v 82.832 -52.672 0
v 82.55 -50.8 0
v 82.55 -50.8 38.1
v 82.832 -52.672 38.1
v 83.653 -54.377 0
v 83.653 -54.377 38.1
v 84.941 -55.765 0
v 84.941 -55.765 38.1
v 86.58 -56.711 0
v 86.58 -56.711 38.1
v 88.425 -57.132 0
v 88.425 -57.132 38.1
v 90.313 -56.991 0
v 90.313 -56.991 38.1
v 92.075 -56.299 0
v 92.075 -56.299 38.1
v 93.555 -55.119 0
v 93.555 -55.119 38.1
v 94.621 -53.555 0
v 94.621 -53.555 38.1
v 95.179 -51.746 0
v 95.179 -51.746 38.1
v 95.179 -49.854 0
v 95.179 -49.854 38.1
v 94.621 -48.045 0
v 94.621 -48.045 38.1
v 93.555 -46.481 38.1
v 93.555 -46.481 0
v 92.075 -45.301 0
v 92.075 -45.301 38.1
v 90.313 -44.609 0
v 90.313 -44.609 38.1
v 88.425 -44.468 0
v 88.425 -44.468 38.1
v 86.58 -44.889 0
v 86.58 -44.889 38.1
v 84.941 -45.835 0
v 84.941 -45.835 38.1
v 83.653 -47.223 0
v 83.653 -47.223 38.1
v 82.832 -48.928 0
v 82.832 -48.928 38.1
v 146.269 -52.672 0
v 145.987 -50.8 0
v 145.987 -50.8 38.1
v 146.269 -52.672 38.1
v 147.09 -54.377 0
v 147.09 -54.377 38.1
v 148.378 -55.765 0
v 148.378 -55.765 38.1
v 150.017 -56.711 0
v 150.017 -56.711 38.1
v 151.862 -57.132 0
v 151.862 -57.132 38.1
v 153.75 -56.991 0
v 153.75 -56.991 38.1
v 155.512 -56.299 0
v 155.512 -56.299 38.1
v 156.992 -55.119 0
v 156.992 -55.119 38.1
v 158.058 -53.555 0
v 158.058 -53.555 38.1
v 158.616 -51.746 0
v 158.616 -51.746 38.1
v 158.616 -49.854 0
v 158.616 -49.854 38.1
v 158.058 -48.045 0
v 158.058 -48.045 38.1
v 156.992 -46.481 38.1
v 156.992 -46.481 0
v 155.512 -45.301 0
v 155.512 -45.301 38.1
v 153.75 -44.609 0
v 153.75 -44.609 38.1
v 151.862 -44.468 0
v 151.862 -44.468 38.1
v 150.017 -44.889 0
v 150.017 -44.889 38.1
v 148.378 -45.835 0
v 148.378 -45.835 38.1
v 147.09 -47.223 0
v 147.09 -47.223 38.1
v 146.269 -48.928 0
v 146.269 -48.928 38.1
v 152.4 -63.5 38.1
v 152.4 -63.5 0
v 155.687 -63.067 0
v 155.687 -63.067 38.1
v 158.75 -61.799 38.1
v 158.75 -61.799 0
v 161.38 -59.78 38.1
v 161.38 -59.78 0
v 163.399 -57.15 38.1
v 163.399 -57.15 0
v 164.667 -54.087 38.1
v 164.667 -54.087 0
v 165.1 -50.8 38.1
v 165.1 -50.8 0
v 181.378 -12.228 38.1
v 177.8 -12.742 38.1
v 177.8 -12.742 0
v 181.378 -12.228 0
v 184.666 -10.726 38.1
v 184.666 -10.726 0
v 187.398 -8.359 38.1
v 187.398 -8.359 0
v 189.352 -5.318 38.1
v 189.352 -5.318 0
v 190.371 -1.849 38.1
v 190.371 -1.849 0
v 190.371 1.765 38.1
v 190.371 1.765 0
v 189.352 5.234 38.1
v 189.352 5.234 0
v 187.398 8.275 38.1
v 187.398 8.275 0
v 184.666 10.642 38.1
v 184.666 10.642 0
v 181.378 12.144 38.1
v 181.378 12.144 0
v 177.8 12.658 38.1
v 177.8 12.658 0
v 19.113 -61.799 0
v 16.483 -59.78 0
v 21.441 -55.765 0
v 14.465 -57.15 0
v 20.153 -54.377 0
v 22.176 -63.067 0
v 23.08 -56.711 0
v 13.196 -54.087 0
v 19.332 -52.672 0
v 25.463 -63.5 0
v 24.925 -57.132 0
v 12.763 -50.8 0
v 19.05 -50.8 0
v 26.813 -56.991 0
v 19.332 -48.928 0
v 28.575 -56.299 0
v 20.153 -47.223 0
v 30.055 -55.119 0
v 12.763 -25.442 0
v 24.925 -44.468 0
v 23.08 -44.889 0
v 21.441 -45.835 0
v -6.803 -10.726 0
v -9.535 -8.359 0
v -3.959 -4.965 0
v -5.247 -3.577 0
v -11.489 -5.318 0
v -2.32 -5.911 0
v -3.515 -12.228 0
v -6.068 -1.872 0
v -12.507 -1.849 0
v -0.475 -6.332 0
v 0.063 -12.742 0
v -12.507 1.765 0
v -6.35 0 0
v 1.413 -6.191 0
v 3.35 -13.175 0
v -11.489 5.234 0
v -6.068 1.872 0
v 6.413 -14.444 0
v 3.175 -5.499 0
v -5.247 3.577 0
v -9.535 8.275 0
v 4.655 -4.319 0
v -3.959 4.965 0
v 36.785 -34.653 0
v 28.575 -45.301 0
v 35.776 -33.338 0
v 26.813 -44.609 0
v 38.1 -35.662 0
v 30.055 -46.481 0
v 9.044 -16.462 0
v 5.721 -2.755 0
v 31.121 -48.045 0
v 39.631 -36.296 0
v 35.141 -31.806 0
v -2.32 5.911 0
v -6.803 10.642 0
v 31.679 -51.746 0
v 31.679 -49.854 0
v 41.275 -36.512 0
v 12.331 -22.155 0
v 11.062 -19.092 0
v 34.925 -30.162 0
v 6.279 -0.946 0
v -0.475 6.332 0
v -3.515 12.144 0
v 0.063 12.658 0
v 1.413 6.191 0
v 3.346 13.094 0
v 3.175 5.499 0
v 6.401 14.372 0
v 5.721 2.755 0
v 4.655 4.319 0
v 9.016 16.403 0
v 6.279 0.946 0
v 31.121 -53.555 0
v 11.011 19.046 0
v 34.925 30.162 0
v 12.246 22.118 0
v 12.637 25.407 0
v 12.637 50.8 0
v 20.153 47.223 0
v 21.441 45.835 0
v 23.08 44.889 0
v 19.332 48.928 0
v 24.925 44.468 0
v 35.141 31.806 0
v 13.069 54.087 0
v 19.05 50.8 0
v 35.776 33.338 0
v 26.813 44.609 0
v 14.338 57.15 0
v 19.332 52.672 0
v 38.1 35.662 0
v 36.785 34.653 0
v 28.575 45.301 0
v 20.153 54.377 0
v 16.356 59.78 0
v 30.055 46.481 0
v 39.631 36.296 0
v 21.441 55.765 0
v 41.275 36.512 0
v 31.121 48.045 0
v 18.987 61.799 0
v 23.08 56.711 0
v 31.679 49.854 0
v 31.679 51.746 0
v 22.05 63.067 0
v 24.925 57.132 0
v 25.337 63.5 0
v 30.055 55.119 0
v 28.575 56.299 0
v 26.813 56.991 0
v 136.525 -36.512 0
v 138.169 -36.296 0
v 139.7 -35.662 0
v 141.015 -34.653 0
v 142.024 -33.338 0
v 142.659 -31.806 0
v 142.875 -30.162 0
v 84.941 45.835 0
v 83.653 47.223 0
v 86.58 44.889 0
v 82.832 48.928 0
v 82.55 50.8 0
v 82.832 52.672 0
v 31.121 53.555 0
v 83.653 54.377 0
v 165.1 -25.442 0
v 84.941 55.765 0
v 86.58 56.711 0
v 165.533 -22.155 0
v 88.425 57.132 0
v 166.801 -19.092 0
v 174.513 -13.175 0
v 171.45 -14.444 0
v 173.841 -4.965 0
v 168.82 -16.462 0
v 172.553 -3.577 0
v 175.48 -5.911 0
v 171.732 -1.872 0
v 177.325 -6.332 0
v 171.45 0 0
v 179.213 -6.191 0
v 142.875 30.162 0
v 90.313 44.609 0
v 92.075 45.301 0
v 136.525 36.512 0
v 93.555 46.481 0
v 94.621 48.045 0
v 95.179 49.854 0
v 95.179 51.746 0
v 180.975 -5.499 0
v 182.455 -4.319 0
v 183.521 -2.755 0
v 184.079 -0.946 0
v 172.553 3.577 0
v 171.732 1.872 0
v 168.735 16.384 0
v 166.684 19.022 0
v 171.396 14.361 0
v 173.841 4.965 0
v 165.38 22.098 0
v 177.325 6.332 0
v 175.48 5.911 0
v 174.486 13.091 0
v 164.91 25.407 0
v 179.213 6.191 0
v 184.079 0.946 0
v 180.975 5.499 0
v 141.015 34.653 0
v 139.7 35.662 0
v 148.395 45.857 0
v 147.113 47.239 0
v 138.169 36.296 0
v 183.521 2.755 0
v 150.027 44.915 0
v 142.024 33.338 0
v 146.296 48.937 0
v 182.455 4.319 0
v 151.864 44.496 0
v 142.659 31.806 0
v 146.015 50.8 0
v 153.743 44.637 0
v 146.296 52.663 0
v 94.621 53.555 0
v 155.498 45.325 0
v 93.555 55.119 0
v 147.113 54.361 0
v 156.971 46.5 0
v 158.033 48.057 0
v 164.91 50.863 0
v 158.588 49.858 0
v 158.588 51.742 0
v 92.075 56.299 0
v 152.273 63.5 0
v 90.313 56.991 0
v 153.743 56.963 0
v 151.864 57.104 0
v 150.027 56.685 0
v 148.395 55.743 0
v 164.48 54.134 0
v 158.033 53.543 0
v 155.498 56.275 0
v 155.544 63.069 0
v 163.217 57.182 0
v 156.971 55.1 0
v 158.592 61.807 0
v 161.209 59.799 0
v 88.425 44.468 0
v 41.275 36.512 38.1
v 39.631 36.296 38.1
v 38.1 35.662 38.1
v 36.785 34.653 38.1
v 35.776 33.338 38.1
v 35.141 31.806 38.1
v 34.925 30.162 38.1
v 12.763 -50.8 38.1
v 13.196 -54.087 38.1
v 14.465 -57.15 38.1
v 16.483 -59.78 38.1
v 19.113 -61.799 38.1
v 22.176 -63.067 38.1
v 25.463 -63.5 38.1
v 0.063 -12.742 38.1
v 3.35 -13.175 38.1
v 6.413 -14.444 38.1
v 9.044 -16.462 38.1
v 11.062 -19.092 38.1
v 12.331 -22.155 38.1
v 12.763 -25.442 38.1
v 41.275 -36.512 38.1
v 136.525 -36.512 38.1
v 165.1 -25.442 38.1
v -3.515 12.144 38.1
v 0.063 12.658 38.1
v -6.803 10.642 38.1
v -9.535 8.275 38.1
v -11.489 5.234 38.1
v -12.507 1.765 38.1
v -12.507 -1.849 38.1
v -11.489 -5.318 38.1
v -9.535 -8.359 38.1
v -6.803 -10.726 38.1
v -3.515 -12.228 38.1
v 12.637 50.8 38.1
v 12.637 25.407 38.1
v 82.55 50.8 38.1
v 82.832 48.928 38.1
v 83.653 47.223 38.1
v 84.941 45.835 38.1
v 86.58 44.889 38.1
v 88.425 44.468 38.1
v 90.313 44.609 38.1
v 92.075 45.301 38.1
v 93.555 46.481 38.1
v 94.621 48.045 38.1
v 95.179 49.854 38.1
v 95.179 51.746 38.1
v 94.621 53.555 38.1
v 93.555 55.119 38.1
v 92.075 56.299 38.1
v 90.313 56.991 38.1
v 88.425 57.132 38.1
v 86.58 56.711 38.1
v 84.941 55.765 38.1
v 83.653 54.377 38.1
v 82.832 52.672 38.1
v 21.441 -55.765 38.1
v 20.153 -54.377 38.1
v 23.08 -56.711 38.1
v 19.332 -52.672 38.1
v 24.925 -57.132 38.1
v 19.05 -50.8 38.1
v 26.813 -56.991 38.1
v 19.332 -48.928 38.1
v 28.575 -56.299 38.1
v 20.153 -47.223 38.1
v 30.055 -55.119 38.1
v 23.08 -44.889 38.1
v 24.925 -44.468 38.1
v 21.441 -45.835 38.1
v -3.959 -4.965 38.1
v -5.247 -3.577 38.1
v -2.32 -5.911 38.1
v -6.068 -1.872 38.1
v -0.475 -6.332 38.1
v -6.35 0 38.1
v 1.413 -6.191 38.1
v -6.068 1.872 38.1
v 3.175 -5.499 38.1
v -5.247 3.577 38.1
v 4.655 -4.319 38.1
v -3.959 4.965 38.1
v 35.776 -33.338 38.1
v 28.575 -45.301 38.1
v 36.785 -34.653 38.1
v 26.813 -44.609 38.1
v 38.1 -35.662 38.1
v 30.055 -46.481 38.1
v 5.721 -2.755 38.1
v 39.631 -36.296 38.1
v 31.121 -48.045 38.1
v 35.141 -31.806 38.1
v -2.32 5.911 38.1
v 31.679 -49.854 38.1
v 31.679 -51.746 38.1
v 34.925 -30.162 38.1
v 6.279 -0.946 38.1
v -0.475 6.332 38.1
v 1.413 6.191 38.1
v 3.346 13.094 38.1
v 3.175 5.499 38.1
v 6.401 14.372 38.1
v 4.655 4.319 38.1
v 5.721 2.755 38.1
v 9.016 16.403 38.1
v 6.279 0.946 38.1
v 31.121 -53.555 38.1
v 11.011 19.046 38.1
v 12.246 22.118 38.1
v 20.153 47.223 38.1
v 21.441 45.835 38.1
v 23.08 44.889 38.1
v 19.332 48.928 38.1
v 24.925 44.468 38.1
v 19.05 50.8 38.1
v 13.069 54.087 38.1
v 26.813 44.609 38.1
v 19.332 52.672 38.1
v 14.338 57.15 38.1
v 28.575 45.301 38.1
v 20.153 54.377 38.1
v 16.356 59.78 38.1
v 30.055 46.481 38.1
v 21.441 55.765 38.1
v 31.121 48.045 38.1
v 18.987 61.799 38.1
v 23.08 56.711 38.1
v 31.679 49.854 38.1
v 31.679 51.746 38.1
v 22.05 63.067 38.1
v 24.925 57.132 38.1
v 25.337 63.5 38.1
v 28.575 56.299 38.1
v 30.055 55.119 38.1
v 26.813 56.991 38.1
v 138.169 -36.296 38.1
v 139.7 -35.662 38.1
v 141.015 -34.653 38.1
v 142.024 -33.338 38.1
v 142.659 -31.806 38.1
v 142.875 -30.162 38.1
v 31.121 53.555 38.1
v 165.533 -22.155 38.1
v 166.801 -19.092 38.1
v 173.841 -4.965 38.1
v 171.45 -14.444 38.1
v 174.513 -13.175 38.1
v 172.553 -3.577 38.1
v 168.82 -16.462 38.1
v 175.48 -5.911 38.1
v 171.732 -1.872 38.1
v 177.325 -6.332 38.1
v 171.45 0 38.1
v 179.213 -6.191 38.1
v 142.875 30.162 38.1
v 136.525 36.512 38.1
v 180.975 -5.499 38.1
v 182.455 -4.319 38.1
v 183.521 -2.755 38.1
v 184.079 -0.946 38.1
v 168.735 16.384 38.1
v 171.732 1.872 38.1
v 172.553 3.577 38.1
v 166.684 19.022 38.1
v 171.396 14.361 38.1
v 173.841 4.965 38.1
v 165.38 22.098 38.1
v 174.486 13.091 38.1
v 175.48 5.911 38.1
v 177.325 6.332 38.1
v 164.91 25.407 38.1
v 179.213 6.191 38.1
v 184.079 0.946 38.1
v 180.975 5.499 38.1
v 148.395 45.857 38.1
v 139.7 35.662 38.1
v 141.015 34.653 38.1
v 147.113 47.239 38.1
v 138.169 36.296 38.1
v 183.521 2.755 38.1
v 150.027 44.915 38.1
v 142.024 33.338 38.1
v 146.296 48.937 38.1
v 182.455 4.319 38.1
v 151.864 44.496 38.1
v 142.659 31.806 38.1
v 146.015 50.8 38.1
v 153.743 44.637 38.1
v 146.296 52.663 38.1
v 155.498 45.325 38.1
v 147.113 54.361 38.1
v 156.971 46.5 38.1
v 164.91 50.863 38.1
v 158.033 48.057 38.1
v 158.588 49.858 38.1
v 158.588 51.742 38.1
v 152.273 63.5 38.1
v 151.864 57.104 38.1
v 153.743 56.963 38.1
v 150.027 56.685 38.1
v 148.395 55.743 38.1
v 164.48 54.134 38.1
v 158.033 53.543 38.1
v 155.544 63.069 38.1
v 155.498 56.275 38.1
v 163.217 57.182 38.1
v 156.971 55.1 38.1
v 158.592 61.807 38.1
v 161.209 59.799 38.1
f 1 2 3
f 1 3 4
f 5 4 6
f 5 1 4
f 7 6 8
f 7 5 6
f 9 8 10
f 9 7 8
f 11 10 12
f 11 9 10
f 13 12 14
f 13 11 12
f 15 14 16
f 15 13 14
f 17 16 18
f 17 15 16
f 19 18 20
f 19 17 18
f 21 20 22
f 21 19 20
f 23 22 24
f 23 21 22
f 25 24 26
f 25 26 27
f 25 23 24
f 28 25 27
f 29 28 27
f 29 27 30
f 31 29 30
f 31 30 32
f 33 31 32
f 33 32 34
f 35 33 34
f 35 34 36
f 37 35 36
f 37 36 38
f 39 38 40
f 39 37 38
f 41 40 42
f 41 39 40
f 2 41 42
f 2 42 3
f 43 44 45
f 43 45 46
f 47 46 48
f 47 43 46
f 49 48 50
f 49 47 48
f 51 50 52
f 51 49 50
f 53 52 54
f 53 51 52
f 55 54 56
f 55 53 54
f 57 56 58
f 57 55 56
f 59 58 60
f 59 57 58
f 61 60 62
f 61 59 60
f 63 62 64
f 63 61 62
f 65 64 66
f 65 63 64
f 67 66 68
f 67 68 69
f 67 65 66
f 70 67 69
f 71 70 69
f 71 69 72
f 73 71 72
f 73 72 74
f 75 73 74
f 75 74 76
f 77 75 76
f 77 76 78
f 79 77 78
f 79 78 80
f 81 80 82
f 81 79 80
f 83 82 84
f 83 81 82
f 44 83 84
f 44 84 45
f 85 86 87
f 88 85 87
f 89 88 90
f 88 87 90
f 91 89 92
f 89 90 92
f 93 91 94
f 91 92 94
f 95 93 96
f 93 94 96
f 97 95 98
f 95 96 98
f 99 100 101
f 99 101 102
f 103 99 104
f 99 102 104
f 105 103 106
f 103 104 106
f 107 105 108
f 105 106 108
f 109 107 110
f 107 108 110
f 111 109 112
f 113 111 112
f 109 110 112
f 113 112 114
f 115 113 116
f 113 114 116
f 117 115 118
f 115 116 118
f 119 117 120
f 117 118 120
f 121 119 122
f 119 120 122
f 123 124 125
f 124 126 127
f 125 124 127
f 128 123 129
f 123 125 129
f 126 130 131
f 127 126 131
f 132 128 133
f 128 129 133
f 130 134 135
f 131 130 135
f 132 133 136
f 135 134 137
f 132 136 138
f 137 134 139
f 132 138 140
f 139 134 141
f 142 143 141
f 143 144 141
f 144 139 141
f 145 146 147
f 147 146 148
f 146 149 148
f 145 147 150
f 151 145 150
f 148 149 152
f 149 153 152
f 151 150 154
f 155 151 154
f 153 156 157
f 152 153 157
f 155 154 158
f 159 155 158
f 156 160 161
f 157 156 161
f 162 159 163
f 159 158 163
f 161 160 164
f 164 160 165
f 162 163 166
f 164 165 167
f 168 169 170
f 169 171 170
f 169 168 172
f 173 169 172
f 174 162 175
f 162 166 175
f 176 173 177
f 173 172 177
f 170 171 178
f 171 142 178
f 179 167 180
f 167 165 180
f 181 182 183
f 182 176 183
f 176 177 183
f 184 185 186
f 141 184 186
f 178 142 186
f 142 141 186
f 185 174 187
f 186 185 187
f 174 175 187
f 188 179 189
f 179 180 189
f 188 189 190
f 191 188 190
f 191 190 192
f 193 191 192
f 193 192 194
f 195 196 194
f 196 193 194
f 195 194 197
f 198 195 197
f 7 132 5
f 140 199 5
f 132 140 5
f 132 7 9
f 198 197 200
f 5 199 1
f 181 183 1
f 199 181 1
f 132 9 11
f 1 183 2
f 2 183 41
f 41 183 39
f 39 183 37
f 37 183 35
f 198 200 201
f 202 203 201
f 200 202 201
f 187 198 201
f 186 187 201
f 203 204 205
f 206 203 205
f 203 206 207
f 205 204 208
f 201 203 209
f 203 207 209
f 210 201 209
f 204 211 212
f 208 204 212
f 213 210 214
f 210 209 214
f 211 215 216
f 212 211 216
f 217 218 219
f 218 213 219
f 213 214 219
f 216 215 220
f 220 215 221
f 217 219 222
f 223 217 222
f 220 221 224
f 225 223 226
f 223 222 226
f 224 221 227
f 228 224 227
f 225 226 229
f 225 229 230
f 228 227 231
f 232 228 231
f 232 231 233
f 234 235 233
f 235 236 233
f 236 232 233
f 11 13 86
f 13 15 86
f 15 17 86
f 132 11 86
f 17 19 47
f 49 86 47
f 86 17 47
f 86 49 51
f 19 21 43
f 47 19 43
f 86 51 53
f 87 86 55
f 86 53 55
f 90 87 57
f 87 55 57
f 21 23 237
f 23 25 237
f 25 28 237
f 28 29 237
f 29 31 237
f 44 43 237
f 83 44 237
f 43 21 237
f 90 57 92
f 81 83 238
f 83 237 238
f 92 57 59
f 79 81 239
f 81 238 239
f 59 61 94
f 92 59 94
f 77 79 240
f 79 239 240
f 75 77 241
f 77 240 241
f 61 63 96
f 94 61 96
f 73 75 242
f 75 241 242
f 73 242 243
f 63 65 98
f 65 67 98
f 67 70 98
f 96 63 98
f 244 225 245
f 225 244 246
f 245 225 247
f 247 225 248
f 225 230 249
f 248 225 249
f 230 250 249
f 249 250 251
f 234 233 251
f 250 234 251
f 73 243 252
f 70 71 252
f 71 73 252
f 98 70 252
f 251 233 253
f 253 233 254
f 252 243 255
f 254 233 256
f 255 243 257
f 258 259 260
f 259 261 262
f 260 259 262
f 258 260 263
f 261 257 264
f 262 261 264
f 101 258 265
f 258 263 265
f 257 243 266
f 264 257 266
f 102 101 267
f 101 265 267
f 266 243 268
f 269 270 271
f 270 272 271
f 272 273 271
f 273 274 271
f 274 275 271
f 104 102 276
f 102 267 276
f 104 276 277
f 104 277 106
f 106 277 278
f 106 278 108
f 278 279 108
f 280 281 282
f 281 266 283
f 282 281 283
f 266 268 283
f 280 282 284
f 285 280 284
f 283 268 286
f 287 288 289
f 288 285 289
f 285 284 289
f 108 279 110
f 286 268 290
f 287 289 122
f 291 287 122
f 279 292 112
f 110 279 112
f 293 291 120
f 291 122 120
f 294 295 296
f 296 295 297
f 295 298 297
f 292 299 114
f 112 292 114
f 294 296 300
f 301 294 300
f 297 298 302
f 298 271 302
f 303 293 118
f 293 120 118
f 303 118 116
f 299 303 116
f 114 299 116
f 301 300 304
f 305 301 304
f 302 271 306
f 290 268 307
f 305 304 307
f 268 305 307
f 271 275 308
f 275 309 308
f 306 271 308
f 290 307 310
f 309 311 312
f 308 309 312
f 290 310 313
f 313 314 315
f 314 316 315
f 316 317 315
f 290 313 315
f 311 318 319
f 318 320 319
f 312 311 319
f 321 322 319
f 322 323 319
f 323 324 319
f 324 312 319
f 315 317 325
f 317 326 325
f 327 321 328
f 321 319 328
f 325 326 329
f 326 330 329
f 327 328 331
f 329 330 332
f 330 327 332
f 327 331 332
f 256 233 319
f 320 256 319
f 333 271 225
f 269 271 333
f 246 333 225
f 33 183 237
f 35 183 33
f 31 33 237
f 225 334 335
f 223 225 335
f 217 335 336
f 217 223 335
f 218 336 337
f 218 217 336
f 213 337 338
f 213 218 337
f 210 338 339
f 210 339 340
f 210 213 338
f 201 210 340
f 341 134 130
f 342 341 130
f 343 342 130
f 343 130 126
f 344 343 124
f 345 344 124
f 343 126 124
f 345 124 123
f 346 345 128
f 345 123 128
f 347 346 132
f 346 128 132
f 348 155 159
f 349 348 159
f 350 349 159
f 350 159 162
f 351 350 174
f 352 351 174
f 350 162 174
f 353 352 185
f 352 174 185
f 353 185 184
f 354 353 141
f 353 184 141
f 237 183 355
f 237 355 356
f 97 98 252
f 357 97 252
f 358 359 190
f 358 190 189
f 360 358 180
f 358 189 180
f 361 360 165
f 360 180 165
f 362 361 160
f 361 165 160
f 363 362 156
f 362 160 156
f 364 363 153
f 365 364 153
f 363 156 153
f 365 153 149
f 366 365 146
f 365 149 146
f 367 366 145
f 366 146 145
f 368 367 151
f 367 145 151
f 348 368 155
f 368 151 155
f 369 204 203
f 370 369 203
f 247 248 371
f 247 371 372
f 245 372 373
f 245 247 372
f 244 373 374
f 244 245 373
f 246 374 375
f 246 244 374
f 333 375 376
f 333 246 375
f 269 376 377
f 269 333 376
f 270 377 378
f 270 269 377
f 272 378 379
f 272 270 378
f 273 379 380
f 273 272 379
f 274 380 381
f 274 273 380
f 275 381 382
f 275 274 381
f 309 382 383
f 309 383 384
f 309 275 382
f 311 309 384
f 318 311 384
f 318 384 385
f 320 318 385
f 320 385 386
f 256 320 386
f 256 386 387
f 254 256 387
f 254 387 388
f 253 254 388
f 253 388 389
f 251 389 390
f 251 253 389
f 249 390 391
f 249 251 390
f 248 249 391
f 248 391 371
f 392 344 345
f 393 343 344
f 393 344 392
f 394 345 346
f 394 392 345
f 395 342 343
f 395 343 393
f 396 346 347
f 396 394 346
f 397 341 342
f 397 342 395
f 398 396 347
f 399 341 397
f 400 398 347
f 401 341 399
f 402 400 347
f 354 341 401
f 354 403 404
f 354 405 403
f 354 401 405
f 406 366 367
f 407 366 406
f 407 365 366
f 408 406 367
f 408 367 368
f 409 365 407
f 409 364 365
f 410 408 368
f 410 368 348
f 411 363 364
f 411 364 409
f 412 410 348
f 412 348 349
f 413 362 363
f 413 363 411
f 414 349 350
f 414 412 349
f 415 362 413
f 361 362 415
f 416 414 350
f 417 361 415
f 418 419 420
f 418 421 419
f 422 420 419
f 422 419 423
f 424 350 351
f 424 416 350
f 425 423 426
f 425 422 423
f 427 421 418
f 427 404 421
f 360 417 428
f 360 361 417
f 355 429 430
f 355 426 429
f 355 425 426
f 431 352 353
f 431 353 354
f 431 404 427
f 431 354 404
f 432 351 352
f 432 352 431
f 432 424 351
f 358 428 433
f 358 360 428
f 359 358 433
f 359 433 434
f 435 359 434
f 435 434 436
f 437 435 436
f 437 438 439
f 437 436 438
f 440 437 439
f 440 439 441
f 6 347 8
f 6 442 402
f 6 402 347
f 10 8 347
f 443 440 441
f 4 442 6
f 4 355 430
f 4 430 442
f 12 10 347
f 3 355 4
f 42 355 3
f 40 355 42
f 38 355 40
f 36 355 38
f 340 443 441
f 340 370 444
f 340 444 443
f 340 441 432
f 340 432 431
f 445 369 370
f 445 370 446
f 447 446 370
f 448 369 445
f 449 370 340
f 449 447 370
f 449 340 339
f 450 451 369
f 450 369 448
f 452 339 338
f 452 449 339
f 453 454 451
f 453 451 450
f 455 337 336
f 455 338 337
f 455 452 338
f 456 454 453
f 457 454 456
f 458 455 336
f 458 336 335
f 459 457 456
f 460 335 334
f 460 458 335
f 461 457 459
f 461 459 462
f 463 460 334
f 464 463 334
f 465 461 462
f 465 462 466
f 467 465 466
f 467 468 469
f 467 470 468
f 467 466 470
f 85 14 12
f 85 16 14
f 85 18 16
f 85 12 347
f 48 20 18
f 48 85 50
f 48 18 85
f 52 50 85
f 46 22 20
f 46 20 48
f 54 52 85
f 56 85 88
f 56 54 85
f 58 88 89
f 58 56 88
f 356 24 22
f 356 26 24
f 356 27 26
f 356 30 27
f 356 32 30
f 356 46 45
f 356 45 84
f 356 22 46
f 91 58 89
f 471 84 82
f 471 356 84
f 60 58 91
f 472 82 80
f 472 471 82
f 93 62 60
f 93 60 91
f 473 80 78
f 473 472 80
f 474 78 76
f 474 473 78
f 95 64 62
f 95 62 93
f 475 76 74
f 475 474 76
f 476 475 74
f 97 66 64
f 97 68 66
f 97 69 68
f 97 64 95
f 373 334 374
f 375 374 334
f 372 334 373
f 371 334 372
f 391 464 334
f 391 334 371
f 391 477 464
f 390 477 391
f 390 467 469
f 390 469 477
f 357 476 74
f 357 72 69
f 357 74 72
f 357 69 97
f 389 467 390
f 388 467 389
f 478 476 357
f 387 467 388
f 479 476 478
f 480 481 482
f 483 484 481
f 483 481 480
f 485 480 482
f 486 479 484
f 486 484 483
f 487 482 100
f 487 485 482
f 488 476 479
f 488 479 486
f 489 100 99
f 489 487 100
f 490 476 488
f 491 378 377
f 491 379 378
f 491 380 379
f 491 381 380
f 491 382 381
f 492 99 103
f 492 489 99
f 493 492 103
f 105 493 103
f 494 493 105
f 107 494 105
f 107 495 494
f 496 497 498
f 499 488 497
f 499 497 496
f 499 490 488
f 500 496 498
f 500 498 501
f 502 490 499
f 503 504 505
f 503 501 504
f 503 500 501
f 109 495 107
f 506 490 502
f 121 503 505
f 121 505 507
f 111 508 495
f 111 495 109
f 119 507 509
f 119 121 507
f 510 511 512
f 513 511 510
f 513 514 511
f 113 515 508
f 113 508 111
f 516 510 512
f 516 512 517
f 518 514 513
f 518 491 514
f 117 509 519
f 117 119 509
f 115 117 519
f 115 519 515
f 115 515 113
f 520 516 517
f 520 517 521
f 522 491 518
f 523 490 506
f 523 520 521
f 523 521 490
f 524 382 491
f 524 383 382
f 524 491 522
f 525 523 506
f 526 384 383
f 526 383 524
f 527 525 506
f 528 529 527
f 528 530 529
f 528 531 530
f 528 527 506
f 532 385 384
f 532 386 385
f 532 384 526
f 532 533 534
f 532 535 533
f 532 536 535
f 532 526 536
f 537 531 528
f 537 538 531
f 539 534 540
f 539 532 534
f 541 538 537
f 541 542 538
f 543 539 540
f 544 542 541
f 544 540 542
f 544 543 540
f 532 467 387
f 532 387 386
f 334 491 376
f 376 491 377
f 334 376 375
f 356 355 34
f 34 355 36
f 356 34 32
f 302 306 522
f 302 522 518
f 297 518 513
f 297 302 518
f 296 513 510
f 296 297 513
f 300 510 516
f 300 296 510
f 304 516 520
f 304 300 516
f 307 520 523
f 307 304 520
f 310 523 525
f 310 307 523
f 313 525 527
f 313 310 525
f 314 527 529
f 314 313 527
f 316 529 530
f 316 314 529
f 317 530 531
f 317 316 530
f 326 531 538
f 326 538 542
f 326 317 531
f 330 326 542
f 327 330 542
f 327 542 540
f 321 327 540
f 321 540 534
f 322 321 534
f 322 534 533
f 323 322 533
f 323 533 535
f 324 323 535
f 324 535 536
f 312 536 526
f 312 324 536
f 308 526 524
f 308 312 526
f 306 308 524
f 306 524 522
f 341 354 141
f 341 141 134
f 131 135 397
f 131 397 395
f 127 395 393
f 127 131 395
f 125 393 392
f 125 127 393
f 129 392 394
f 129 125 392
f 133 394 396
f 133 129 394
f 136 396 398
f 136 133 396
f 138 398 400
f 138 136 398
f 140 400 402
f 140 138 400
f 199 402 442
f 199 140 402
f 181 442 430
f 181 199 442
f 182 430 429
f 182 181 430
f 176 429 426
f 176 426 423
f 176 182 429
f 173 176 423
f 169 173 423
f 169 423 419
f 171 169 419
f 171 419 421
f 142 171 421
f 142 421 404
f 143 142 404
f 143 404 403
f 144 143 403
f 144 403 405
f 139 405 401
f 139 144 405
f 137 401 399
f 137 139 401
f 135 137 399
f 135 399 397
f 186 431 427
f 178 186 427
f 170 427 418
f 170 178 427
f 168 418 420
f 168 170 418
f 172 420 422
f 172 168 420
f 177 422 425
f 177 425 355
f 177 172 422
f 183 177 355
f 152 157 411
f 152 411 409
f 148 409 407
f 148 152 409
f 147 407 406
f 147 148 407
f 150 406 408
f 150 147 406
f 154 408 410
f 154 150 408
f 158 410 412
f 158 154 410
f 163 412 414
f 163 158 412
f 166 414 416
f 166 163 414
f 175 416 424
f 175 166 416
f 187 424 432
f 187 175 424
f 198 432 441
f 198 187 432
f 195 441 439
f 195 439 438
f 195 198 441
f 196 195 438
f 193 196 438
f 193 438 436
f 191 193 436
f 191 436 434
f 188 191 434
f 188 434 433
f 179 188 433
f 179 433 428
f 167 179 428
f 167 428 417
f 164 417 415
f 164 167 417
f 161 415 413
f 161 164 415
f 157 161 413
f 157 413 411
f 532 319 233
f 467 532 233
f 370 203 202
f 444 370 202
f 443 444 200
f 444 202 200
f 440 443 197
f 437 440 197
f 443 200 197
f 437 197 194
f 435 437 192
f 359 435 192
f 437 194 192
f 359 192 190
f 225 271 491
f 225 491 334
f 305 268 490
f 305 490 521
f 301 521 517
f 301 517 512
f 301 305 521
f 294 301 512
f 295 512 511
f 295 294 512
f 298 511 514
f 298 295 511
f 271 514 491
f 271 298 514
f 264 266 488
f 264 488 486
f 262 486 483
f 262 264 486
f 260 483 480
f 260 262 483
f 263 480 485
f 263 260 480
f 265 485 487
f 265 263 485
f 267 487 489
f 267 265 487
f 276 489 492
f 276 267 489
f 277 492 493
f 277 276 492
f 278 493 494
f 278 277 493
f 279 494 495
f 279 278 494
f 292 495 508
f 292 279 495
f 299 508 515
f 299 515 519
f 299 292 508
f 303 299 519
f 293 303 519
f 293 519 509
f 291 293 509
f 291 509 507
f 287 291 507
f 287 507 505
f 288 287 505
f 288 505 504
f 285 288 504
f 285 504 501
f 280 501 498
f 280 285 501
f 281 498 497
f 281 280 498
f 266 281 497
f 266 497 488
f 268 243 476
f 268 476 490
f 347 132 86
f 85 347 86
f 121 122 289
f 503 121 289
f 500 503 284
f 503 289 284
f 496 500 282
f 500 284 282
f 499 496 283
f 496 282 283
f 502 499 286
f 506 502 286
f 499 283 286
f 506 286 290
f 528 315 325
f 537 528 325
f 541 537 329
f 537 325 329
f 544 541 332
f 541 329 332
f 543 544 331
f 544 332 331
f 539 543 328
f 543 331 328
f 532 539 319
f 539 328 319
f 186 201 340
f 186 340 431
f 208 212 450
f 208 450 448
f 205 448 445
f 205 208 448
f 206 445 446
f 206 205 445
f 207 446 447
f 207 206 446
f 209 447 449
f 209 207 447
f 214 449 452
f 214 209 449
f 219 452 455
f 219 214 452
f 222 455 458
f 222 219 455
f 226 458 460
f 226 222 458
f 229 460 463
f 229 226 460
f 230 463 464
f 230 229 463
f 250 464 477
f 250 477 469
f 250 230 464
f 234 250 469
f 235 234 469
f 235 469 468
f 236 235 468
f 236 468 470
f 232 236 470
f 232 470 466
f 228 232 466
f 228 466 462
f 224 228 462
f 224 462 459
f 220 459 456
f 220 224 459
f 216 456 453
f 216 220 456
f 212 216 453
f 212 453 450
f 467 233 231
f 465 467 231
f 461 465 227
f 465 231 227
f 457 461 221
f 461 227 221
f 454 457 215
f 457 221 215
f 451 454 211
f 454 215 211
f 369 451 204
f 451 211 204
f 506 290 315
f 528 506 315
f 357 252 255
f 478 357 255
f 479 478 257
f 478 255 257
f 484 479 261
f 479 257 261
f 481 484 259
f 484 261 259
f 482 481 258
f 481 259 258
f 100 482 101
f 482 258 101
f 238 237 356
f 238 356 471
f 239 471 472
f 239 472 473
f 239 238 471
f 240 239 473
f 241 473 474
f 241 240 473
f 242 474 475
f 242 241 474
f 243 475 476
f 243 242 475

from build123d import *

# Parameters (mm, degrees)
SKETCH1_R           = 6.35
SKETCH1_R_2         = 6.321908291
BOSS_EXTRUDE1_DEPTH = 38.1


with BuildPart() as part:
    # Sketch1 → Boss-Extrude1 (new body)
    with BuildSketch(Plane.XY):
        with BuildLine():
            Line((25.4632885, -63.5), (152.4, -63.5))
            ThreePointArc((152.4, -63.5), (161.380256121, -59.780256121), (165.1, -50.8))
            Line((165.1, -50.8), (165.1, -25.442050481))
            ThreePointArc((165.1, -25.442050481), (168.819743879, -16.46179436), (177.8, -12.742050481))
            ThreePointArc((177.8, -12.742050481), (190.5, -0.042050481), (177.8, 12.657949519))
            ThreePointArc((177.8, 12.657949519), (168.735231625, 16.383513436), (164.910134501, 25.406732606))
            Line((164.910134501, 25.406732606), (164.910134501, 50.8632885))
            ThreePointArc((164.910134501, 50.8632885), (161.208927395, 59.798792893), (152.273423001, 63.5))
            Line((152.273423001, 63.5), (25.3367115, 63.5))
            ThreePointArc((25.3367115, 63.5), (16.356455379, 59.780256121), (12.6367115, 50.8))
            Line((12.6367115, 50.8), (12.6367115, 25.406732606))
            ThreePointArc((12.6367115, 25.406732606), (9.016254993, 16.402760527), (0.0632885, 12.657949519))
            ThreePointArc((0.0632885, 12.657949519), (-12.6367115, -0.042050481), (0.0632885, -12.742050481))
            ThreePointArc((0.0632885, -12.742050481), (9.043544621, -16.46179436), (12.7632885, -25.442050481))
            Line((12.7632885, -25.442050481), (12.7632885, -50.8))
            ThreePointArc((12.7632885, -50.8), (16.483032379, -59.780256121), (25.4632885, -63.5))
        make_face()
        with Locations(Location((0, 0, 0), (0, 0, 180))):
            Circle(SKETCH1_R, mode=Mode.SUBTRACT)
        with Locations(Location((177.8, 0, 0), (0, 0, 180))):
            Circle(SKETCH1_R, mode=Mode.SUBTRACT)
        with Locations(Location((88.9, 50.8, 0), (0, 0, 180))):
            Circle(SKETCH1_R, mode=Mode.SUBTRACT)
        with Locations(Location((88.9, -50.8, 0), (0, 0, 180))):
            Circle(SKETCH1_R, mode=Mode.SUBTRACT)
        with Locations(Location((152.3367115, 50.8, 0), (0, 0, 180))):
            Circle(SKETCH1_R_2, mode=Mode.SUBTRACT)
        with Locations(Location((25.4, 50.8, 0), (0, 0, 180))):
            Circle(SKETCH1_R, mode=Mode.SUBTRACT)
        with Locations(Location((25.4, -50.8, 0), (0, 0, 180))):
            Circle(SKETCH1_R, mode=Mode.SUBTRACT)
        with Locations(Location((152.3367115, -50.8, 0), (0, 0, 180))):
            Circle(SKETCH1_R, mode=Mode.SUBTRACT)
        with BuildLine():
            Line((34.925, 30.1625), (34.925, -30.1625))
            ThreePointArc((34.925, -30.1625), (36.784871939, -34.652628061), (41.275, -36.5125))
            Line((41.275, -36.5125), (136.525, -36.5125))
            ThreePointArc((136.525, -36.5125), (141.015128061, -34.652628061), (142.875, -30.1625))
            Line((142.875, -30.1625), (142.875, 30.1625))
            ThreePointArc((142.875, 30.1625), (141.015128061, 34.652628061), (136.525, 36.5125))
            Line((136.525, 36.5125), (41.275, 36.5125))
            ThreePointArc((41.275, 36.5125), (36.784871939, 34.652628061), (34.925, 30.1625))
        make_face(mode=Mode.SUBTRACT)
    extrude(amount=BOSS_EXTRUDE1_DEPTH)


solid = part.part
